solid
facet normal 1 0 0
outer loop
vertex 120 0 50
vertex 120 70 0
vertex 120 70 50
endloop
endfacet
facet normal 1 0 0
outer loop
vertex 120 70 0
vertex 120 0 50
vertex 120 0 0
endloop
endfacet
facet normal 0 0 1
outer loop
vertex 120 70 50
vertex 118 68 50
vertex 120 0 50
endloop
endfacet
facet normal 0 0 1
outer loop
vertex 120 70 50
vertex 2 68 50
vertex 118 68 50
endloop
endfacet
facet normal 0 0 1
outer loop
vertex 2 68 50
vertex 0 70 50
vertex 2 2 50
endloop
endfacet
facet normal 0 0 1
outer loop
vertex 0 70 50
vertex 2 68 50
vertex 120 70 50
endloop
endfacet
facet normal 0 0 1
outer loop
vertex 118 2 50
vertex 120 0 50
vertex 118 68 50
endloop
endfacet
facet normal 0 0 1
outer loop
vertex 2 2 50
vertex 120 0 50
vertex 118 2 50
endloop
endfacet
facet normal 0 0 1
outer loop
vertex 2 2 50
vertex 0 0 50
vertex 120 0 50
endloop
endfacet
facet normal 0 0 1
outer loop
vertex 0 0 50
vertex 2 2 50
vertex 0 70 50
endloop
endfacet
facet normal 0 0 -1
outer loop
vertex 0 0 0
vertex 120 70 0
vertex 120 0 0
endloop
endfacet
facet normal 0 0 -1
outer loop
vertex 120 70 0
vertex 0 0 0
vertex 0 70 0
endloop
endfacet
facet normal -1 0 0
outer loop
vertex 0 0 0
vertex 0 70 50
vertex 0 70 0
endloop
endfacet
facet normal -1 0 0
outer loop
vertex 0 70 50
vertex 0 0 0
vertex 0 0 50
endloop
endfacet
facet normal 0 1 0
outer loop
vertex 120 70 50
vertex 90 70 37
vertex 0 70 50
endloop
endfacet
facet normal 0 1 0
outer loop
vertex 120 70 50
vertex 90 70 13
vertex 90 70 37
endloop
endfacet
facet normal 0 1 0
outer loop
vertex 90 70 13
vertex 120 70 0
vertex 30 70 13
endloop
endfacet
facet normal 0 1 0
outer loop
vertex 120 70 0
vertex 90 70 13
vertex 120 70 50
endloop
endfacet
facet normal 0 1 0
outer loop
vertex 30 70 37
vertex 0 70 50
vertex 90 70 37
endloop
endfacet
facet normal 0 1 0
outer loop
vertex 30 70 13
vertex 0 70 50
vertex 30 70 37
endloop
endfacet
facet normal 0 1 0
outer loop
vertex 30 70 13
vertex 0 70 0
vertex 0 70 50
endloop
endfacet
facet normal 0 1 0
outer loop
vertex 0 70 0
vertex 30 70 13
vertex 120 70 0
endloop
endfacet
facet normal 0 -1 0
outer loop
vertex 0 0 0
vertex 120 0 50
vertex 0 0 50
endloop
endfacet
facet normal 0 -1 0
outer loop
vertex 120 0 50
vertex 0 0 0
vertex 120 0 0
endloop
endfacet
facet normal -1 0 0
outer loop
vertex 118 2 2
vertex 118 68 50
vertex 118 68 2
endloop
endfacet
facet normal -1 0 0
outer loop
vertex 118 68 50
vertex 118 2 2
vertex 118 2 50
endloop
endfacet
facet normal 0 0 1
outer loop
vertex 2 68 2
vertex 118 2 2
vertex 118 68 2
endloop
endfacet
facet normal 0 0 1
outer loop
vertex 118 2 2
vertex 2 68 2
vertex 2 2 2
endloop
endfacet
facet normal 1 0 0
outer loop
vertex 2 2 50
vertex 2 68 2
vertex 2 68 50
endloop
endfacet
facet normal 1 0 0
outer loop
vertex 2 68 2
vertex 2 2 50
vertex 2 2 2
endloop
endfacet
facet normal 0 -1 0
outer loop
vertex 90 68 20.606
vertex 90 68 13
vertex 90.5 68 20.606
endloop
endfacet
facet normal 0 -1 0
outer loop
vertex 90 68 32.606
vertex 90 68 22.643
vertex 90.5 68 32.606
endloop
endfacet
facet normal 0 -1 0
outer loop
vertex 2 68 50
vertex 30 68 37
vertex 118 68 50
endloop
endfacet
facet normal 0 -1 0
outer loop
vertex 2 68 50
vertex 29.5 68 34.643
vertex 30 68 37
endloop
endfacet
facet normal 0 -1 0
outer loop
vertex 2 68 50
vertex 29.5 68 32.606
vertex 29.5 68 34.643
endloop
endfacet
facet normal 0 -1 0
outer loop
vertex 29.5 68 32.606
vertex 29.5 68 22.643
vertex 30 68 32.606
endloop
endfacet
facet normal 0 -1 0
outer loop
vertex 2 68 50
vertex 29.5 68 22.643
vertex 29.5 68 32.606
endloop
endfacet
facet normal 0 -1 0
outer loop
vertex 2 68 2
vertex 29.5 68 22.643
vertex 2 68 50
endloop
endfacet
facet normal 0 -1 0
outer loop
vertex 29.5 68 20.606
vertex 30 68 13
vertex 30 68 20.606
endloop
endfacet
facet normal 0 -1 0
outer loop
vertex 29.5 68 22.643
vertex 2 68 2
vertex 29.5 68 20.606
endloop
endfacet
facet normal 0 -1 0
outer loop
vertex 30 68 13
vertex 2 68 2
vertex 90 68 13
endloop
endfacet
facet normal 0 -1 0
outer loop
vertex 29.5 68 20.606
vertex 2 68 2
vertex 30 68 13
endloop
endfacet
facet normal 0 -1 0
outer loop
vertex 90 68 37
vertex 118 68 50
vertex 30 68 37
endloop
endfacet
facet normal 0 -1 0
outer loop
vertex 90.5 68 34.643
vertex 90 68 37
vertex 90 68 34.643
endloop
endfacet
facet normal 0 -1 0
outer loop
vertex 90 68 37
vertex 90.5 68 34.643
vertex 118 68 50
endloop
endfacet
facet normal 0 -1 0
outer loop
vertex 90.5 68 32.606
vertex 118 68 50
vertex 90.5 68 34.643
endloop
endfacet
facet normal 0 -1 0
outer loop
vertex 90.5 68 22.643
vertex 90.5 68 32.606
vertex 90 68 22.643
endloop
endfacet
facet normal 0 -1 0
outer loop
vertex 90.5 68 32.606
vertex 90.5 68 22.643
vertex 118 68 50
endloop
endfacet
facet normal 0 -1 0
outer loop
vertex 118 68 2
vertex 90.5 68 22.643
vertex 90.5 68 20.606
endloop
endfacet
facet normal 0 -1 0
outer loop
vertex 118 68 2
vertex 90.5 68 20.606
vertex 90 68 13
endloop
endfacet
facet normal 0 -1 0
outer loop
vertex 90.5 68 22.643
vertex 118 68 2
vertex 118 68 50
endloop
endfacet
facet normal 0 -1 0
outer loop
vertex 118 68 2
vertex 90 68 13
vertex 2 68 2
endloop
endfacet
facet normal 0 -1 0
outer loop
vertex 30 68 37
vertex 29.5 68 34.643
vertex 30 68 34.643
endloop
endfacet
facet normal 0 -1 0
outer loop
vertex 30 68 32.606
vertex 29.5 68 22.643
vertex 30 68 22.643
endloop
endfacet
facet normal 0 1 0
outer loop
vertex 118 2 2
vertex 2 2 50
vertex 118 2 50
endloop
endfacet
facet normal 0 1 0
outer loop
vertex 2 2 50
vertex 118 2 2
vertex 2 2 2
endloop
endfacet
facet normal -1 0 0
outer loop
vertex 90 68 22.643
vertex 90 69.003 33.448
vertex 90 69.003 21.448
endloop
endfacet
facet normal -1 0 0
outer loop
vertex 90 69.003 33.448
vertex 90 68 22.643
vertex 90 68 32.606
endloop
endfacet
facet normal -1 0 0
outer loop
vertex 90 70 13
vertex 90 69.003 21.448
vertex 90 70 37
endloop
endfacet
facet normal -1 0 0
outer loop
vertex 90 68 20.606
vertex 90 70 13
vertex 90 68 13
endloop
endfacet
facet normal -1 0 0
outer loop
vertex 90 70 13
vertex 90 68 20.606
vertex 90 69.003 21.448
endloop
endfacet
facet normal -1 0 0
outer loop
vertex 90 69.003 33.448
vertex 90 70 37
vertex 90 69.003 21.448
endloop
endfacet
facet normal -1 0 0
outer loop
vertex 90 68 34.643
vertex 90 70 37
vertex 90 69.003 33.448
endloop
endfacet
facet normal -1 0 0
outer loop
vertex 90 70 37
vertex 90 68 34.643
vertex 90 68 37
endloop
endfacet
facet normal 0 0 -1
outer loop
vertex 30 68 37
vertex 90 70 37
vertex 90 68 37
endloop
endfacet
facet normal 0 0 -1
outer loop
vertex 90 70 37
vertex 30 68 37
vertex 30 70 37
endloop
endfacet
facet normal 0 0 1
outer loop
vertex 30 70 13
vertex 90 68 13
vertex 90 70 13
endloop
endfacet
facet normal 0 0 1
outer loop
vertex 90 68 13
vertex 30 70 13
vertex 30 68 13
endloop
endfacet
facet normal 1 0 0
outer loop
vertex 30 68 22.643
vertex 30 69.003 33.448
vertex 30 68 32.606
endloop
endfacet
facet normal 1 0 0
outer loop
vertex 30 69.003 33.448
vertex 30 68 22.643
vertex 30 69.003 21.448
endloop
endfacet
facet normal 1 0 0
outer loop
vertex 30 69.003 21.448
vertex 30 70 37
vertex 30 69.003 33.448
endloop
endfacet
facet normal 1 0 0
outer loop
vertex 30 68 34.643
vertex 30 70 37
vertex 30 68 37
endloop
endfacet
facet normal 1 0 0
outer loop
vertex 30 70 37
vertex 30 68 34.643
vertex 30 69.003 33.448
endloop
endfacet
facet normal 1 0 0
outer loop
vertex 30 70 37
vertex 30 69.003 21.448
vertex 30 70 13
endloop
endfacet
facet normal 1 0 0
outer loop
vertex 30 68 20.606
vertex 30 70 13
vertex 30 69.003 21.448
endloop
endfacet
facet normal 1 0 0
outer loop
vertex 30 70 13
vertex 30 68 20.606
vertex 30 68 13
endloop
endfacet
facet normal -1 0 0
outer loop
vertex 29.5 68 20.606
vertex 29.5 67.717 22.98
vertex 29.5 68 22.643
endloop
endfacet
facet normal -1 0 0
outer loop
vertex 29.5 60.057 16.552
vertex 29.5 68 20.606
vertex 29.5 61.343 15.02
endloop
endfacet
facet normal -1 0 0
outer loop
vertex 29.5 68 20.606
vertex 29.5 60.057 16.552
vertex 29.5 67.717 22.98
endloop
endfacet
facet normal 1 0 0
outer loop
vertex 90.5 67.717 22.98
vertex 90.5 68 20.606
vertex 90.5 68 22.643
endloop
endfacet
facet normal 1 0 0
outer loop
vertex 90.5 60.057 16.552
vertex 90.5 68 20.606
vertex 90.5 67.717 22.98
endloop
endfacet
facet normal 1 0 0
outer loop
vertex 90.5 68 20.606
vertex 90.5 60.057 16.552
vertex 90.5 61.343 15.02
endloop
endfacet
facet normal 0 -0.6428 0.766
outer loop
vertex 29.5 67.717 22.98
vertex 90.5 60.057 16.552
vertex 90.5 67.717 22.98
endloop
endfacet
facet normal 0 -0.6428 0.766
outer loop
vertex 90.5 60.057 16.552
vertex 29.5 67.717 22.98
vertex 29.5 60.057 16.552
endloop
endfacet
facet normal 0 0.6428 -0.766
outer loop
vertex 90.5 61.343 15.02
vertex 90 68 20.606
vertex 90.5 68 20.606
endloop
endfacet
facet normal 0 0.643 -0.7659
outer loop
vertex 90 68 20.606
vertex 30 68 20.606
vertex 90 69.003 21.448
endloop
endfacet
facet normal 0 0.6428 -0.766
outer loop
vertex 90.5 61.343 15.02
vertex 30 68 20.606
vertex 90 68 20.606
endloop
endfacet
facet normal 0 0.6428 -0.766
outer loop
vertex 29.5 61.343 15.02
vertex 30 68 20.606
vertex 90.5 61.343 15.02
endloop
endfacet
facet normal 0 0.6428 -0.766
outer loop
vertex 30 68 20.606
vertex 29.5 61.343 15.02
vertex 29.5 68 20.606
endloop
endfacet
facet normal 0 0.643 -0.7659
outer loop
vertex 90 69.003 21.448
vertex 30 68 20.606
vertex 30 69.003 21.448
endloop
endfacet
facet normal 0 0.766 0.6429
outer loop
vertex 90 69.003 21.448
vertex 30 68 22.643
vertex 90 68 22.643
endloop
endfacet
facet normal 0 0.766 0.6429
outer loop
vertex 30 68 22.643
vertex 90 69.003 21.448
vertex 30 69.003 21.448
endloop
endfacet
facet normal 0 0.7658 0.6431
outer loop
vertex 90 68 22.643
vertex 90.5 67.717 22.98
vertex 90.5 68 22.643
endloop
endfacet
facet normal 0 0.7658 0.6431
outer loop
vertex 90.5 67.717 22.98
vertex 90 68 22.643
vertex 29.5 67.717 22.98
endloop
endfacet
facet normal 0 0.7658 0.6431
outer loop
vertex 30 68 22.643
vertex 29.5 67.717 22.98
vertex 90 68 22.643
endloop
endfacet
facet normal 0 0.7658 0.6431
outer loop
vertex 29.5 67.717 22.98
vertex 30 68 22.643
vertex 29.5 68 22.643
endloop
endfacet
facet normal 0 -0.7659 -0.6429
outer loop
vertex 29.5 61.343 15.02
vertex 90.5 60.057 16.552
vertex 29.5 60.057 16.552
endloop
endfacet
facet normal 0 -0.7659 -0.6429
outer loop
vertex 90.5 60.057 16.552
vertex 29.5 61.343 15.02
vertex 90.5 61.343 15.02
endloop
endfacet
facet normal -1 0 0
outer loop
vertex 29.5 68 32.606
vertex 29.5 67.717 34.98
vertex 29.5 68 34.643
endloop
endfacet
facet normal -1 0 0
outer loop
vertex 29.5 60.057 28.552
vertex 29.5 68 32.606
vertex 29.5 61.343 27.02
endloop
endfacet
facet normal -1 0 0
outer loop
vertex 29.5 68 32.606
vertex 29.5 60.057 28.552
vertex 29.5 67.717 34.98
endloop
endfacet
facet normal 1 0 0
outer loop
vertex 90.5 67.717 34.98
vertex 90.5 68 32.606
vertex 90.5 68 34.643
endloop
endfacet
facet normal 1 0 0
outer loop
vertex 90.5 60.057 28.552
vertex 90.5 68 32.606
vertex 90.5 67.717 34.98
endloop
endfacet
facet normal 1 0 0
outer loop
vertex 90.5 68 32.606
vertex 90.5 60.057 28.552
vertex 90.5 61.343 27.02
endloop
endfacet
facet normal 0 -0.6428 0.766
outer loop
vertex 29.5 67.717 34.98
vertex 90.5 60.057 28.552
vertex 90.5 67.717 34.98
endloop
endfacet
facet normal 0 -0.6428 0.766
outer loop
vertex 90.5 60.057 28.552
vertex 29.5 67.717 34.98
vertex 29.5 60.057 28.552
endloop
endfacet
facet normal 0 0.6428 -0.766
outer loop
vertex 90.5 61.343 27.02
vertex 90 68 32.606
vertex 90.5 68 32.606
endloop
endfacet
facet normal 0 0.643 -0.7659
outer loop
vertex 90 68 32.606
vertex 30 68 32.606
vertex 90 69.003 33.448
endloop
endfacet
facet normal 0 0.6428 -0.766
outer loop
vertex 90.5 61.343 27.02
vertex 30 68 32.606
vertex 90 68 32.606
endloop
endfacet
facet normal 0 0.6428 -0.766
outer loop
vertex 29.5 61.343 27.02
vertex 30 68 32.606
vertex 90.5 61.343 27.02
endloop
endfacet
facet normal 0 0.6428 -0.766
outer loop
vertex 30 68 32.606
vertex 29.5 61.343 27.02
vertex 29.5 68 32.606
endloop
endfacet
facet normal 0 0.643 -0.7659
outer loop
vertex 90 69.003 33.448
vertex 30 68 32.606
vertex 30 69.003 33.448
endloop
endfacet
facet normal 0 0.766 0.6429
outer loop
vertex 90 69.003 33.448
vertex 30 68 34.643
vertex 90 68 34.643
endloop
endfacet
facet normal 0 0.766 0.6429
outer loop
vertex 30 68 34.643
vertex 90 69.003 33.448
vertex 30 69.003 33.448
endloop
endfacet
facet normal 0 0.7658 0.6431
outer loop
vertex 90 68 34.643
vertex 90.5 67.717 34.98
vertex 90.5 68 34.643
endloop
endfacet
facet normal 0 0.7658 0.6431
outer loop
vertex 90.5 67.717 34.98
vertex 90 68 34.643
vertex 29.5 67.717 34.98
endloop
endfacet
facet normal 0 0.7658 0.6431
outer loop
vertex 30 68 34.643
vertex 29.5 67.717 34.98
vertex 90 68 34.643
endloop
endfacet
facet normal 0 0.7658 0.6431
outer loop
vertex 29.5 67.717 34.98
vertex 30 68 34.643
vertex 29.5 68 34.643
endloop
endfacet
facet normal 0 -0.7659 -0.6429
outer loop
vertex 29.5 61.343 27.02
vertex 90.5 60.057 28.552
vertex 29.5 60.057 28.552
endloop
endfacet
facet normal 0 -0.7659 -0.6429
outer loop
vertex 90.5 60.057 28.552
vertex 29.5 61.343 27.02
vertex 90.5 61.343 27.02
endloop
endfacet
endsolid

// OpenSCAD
$fn = 32;

// ----------------------------------------------------------------------
// Vent box: louvers enclosure
// ----------------------------------------------------------------------

// --- parameters (mm) ---
box_l = 120;              // box length, X
box_w = 70;               // box width, Y
box_h = 50;               // box height, Z
wall_t = 2;               // shell wall thickness
win_l = 60;               // vent window width, X
win_h = 24;               // vent window height, Z
slat_t = 2;               // louver slat thickness
slat_d = 10;              // louver slat depth
slat_a = 40;              // louver slat angle, degrees
slat_pitch = 12;          // louver pitch
slat_yc = 64.53;          // slat centreline Y

win_z0 = (box_h - win_h) / 2;  // window lower edge Z
n_slats = 2;  // louver count
slat_z0 = win_z0 + (win_h - (n_slats - 1) * slat_pitch) / 2;

difference() {
  union() {
    difference() {
      cube([box_l, box_w, box_h]);
  translate([wall_t, wall_t, wall_t])
    cube([box_l - 2 * wall_t, box_w - 2 * wall_t, box_h]);
  translate([(box_l - win_l) / 2, box_w - wall_t - 1, win_z0])
    cube([win_l, wall_t + 2, win_h]);
    }
    for (i = [0 : n_slats - 1])
      translate([box_l / 2, slat_yc, slat_z0 + i * slat_pitch])
        rotate([slat_a, 0, 0])
          cube([win_l + 1, slat_d, slat_t], center = true);
  }
}
